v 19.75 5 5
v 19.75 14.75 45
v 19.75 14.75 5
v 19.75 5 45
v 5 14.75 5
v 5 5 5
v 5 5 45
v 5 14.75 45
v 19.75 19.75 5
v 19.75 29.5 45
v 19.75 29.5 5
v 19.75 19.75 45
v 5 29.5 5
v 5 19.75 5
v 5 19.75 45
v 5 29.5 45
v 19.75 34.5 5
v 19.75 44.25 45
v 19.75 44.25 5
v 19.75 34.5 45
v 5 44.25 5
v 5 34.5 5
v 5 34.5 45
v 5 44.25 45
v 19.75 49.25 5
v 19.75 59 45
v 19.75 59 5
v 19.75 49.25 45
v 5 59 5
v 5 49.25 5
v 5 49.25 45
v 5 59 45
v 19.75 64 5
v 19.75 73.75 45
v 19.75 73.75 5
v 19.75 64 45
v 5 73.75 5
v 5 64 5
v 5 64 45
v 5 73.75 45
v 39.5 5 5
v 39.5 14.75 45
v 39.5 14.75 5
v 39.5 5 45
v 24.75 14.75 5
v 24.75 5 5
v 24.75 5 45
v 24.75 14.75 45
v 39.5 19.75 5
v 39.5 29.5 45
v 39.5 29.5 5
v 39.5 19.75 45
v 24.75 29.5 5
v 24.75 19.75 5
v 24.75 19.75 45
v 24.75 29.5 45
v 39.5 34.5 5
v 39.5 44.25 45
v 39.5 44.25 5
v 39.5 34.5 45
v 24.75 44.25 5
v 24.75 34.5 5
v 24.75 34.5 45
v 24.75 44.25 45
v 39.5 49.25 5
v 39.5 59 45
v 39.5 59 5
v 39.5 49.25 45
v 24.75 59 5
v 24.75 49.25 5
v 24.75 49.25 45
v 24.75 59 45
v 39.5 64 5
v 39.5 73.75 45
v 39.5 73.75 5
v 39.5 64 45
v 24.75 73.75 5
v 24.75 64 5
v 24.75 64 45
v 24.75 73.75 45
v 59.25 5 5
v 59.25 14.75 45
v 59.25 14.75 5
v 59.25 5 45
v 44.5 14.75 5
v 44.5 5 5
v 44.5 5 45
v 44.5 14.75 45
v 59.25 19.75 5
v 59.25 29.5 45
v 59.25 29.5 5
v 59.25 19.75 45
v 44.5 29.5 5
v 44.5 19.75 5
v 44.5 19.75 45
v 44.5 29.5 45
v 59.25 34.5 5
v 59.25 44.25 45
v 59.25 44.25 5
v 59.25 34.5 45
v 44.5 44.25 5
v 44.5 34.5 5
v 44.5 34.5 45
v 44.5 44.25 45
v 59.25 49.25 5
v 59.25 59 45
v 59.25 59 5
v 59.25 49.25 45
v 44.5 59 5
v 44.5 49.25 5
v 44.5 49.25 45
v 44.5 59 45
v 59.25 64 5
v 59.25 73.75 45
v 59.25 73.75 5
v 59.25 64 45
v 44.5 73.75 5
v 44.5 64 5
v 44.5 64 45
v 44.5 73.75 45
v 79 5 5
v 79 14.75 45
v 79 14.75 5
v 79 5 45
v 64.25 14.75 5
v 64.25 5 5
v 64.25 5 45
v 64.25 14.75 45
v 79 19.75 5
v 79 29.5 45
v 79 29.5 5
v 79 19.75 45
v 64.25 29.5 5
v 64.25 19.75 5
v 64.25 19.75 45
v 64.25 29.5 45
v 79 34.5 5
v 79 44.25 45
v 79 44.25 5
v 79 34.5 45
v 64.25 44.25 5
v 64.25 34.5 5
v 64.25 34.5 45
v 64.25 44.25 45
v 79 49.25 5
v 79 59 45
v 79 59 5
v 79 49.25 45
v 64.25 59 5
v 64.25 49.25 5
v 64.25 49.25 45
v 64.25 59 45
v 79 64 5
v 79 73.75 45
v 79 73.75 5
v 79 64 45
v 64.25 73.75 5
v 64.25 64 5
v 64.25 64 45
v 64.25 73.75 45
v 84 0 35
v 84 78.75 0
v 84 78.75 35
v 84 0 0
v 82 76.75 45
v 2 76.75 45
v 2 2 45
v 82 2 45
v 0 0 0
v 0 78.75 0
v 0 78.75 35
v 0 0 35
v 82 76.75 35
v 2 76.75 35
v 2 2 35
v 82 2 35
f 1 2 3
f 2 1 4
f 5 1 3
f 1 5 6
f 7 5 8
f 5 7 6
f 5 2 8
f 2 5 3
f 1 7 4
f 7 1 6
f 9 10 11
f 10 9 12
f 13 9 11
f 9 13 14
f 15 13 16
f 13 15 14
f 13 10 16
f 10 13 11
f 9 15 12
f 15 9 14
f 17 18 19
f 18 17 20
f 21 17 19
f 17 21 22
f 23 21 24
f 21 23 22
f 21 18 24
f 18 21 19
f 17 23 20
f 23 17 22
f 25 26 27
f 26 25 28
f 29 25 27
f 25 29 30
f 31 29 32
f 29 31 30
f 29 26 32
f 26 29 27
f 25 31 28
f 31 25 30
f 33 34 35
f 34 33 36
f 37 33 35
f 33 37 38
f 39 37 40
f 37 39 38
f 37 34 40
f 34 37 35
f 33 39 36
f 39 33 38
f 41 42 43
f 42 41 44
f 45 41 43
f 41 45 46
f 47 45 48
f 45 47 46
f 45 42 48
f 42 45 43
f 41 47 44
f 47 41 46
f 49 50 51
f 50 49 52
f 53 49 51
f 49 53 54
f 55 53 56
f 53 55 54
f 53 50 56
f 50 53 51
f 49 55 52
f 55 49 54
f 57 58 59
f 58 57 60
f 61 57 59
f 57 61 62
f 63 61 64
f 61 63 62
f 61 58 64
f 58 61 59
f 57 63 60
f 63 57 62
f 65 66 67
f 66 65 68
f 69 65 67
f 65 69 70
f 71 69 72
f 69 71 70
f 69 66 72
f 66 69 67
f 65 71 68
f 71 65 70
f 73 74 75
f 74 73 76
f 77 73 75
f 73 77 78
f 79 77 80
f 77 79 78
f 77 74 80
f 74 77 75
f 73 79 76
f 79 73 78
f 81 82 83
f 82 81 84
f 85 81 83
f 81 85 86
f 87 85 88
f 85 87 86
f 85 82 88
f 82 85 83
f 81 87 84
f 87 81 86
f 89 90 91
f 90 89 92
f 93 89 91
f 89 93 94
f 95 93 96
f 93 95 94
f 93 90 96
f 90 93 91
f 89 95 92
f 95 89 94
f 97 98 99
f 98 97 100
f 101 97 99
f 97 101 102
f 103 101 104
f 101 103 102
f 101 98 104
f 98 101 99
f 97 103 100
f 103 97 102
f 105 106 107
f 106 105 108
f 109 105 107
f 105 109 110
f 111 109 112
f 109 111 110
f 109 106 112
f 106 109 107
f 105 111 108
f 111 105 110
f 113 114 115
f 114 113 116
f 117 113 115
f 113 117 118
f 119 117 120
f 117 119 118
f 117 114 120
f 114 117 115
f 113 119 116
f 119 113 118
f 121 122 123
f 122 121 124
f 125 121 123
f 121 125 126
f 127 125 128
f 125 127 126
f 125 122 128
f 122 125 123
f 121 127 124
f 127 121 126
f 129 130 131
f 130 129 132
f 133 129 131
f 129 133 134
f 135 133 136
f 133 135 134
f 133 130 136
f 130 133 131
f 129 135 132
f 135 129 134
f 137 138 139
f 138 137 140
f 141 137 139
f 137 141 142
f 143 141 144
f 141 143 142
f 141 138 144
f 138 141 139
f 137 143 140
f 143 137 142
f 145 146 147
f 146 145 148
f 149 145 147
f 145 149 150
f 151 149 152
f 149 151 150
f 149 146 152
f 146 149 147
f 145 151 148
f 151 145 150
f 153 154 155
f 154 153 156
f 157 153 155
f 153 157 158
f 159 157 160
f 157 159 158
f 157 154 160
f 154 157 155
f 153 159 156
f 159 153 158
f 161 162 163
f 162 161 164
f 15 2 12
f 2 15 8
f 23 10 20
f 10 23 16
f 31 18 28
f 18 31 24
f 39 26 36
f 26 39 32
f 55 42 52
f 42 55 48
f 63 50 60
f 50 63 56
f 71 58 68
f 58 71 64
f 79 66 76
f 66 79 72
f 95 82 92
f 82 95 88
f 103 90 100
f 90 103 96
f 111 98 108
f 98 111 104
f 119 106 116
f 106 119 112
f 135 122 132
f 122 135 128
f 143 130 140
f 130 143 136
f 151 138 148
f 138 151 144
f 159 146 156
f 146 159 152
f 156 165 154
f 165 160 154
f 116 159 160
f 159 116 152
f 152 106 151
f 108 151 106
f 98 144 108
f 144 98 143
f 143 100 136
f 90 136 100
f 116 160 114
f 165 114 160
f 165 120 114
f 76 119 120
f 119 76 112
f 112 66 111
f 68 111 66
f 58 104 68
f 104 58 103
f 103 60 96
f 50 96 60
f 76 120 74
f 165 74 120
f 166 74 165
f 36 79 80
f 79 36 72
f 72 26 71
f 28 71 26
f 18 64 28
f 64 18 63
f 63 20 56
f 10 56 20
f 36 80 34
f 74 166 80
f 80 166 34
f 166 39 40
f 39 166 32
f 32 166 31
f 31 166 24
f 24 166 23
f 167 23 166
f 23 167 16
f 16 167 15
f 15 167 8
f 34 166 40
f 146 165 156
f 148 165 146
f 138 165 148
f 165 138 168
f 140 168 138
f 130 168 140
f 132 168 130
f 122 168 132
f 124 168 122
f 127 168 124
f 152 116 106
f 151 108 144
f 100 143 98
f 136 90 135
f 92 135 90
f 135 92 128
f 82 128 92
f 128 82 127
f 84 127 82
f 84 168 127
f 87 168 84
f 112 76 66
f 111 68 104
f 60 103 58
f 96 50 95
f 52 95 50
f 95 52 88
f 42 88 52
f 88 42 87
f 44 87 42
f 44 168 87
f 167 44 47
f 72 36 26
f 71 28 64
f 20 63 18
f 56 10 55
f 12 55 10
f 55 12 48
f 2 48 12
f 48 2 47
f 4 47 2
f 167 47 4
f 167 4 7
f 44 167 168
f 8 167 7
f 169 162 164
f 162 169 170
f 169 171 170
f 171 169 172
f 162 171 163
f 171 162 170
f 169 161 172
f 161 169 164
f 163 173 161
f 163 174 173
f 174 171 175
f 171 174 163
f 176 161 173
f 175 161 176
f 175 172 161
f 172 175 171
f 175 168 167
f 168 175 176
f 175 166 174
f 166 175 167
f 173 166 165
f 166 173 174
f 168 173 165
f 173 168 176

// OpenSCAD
sfp_col=4;
sfp_row=5;
 
 
module sfp(x,y){
translate([x,y,0]) {
   color([1,0,0])
  cube([14.75,9.75,55]);
}
}

module gbics(sfp_col,sfp_row){
 for(x = [0 : 19.75 : sfp_col*19.75-0.5]){
   for(y = [0 : 14.75 : sfp_row*14.75-0.5]){
     sfp(x,y);
   }
 }
}




module box(sfp_col,sfp_row){
difference(){
cube([sfp_col*19.75+5,sfp_row*14.75+5,45]);
translate([5,5,5]){
     gbics(sfp_col,sfp_row);
 }
}
}



module shell(){
    translate([0,0,35]){
cube([sfp_col*19.75+5,2,20]);
cube([2,sfp_row*14.75+5,20]);
translate([0,sfp_row*14.75+3,0]){
cube([sfp_col*19.75+5,2,20]);
}
translate([sfp_col*19.75+3,0,0]){
cube([2,sfp_row*14.75+5,20]);
}
}
}

difference(){
box(sfp_col,sfp_row);
    shell(sfp_col,sfp_row);
 }
